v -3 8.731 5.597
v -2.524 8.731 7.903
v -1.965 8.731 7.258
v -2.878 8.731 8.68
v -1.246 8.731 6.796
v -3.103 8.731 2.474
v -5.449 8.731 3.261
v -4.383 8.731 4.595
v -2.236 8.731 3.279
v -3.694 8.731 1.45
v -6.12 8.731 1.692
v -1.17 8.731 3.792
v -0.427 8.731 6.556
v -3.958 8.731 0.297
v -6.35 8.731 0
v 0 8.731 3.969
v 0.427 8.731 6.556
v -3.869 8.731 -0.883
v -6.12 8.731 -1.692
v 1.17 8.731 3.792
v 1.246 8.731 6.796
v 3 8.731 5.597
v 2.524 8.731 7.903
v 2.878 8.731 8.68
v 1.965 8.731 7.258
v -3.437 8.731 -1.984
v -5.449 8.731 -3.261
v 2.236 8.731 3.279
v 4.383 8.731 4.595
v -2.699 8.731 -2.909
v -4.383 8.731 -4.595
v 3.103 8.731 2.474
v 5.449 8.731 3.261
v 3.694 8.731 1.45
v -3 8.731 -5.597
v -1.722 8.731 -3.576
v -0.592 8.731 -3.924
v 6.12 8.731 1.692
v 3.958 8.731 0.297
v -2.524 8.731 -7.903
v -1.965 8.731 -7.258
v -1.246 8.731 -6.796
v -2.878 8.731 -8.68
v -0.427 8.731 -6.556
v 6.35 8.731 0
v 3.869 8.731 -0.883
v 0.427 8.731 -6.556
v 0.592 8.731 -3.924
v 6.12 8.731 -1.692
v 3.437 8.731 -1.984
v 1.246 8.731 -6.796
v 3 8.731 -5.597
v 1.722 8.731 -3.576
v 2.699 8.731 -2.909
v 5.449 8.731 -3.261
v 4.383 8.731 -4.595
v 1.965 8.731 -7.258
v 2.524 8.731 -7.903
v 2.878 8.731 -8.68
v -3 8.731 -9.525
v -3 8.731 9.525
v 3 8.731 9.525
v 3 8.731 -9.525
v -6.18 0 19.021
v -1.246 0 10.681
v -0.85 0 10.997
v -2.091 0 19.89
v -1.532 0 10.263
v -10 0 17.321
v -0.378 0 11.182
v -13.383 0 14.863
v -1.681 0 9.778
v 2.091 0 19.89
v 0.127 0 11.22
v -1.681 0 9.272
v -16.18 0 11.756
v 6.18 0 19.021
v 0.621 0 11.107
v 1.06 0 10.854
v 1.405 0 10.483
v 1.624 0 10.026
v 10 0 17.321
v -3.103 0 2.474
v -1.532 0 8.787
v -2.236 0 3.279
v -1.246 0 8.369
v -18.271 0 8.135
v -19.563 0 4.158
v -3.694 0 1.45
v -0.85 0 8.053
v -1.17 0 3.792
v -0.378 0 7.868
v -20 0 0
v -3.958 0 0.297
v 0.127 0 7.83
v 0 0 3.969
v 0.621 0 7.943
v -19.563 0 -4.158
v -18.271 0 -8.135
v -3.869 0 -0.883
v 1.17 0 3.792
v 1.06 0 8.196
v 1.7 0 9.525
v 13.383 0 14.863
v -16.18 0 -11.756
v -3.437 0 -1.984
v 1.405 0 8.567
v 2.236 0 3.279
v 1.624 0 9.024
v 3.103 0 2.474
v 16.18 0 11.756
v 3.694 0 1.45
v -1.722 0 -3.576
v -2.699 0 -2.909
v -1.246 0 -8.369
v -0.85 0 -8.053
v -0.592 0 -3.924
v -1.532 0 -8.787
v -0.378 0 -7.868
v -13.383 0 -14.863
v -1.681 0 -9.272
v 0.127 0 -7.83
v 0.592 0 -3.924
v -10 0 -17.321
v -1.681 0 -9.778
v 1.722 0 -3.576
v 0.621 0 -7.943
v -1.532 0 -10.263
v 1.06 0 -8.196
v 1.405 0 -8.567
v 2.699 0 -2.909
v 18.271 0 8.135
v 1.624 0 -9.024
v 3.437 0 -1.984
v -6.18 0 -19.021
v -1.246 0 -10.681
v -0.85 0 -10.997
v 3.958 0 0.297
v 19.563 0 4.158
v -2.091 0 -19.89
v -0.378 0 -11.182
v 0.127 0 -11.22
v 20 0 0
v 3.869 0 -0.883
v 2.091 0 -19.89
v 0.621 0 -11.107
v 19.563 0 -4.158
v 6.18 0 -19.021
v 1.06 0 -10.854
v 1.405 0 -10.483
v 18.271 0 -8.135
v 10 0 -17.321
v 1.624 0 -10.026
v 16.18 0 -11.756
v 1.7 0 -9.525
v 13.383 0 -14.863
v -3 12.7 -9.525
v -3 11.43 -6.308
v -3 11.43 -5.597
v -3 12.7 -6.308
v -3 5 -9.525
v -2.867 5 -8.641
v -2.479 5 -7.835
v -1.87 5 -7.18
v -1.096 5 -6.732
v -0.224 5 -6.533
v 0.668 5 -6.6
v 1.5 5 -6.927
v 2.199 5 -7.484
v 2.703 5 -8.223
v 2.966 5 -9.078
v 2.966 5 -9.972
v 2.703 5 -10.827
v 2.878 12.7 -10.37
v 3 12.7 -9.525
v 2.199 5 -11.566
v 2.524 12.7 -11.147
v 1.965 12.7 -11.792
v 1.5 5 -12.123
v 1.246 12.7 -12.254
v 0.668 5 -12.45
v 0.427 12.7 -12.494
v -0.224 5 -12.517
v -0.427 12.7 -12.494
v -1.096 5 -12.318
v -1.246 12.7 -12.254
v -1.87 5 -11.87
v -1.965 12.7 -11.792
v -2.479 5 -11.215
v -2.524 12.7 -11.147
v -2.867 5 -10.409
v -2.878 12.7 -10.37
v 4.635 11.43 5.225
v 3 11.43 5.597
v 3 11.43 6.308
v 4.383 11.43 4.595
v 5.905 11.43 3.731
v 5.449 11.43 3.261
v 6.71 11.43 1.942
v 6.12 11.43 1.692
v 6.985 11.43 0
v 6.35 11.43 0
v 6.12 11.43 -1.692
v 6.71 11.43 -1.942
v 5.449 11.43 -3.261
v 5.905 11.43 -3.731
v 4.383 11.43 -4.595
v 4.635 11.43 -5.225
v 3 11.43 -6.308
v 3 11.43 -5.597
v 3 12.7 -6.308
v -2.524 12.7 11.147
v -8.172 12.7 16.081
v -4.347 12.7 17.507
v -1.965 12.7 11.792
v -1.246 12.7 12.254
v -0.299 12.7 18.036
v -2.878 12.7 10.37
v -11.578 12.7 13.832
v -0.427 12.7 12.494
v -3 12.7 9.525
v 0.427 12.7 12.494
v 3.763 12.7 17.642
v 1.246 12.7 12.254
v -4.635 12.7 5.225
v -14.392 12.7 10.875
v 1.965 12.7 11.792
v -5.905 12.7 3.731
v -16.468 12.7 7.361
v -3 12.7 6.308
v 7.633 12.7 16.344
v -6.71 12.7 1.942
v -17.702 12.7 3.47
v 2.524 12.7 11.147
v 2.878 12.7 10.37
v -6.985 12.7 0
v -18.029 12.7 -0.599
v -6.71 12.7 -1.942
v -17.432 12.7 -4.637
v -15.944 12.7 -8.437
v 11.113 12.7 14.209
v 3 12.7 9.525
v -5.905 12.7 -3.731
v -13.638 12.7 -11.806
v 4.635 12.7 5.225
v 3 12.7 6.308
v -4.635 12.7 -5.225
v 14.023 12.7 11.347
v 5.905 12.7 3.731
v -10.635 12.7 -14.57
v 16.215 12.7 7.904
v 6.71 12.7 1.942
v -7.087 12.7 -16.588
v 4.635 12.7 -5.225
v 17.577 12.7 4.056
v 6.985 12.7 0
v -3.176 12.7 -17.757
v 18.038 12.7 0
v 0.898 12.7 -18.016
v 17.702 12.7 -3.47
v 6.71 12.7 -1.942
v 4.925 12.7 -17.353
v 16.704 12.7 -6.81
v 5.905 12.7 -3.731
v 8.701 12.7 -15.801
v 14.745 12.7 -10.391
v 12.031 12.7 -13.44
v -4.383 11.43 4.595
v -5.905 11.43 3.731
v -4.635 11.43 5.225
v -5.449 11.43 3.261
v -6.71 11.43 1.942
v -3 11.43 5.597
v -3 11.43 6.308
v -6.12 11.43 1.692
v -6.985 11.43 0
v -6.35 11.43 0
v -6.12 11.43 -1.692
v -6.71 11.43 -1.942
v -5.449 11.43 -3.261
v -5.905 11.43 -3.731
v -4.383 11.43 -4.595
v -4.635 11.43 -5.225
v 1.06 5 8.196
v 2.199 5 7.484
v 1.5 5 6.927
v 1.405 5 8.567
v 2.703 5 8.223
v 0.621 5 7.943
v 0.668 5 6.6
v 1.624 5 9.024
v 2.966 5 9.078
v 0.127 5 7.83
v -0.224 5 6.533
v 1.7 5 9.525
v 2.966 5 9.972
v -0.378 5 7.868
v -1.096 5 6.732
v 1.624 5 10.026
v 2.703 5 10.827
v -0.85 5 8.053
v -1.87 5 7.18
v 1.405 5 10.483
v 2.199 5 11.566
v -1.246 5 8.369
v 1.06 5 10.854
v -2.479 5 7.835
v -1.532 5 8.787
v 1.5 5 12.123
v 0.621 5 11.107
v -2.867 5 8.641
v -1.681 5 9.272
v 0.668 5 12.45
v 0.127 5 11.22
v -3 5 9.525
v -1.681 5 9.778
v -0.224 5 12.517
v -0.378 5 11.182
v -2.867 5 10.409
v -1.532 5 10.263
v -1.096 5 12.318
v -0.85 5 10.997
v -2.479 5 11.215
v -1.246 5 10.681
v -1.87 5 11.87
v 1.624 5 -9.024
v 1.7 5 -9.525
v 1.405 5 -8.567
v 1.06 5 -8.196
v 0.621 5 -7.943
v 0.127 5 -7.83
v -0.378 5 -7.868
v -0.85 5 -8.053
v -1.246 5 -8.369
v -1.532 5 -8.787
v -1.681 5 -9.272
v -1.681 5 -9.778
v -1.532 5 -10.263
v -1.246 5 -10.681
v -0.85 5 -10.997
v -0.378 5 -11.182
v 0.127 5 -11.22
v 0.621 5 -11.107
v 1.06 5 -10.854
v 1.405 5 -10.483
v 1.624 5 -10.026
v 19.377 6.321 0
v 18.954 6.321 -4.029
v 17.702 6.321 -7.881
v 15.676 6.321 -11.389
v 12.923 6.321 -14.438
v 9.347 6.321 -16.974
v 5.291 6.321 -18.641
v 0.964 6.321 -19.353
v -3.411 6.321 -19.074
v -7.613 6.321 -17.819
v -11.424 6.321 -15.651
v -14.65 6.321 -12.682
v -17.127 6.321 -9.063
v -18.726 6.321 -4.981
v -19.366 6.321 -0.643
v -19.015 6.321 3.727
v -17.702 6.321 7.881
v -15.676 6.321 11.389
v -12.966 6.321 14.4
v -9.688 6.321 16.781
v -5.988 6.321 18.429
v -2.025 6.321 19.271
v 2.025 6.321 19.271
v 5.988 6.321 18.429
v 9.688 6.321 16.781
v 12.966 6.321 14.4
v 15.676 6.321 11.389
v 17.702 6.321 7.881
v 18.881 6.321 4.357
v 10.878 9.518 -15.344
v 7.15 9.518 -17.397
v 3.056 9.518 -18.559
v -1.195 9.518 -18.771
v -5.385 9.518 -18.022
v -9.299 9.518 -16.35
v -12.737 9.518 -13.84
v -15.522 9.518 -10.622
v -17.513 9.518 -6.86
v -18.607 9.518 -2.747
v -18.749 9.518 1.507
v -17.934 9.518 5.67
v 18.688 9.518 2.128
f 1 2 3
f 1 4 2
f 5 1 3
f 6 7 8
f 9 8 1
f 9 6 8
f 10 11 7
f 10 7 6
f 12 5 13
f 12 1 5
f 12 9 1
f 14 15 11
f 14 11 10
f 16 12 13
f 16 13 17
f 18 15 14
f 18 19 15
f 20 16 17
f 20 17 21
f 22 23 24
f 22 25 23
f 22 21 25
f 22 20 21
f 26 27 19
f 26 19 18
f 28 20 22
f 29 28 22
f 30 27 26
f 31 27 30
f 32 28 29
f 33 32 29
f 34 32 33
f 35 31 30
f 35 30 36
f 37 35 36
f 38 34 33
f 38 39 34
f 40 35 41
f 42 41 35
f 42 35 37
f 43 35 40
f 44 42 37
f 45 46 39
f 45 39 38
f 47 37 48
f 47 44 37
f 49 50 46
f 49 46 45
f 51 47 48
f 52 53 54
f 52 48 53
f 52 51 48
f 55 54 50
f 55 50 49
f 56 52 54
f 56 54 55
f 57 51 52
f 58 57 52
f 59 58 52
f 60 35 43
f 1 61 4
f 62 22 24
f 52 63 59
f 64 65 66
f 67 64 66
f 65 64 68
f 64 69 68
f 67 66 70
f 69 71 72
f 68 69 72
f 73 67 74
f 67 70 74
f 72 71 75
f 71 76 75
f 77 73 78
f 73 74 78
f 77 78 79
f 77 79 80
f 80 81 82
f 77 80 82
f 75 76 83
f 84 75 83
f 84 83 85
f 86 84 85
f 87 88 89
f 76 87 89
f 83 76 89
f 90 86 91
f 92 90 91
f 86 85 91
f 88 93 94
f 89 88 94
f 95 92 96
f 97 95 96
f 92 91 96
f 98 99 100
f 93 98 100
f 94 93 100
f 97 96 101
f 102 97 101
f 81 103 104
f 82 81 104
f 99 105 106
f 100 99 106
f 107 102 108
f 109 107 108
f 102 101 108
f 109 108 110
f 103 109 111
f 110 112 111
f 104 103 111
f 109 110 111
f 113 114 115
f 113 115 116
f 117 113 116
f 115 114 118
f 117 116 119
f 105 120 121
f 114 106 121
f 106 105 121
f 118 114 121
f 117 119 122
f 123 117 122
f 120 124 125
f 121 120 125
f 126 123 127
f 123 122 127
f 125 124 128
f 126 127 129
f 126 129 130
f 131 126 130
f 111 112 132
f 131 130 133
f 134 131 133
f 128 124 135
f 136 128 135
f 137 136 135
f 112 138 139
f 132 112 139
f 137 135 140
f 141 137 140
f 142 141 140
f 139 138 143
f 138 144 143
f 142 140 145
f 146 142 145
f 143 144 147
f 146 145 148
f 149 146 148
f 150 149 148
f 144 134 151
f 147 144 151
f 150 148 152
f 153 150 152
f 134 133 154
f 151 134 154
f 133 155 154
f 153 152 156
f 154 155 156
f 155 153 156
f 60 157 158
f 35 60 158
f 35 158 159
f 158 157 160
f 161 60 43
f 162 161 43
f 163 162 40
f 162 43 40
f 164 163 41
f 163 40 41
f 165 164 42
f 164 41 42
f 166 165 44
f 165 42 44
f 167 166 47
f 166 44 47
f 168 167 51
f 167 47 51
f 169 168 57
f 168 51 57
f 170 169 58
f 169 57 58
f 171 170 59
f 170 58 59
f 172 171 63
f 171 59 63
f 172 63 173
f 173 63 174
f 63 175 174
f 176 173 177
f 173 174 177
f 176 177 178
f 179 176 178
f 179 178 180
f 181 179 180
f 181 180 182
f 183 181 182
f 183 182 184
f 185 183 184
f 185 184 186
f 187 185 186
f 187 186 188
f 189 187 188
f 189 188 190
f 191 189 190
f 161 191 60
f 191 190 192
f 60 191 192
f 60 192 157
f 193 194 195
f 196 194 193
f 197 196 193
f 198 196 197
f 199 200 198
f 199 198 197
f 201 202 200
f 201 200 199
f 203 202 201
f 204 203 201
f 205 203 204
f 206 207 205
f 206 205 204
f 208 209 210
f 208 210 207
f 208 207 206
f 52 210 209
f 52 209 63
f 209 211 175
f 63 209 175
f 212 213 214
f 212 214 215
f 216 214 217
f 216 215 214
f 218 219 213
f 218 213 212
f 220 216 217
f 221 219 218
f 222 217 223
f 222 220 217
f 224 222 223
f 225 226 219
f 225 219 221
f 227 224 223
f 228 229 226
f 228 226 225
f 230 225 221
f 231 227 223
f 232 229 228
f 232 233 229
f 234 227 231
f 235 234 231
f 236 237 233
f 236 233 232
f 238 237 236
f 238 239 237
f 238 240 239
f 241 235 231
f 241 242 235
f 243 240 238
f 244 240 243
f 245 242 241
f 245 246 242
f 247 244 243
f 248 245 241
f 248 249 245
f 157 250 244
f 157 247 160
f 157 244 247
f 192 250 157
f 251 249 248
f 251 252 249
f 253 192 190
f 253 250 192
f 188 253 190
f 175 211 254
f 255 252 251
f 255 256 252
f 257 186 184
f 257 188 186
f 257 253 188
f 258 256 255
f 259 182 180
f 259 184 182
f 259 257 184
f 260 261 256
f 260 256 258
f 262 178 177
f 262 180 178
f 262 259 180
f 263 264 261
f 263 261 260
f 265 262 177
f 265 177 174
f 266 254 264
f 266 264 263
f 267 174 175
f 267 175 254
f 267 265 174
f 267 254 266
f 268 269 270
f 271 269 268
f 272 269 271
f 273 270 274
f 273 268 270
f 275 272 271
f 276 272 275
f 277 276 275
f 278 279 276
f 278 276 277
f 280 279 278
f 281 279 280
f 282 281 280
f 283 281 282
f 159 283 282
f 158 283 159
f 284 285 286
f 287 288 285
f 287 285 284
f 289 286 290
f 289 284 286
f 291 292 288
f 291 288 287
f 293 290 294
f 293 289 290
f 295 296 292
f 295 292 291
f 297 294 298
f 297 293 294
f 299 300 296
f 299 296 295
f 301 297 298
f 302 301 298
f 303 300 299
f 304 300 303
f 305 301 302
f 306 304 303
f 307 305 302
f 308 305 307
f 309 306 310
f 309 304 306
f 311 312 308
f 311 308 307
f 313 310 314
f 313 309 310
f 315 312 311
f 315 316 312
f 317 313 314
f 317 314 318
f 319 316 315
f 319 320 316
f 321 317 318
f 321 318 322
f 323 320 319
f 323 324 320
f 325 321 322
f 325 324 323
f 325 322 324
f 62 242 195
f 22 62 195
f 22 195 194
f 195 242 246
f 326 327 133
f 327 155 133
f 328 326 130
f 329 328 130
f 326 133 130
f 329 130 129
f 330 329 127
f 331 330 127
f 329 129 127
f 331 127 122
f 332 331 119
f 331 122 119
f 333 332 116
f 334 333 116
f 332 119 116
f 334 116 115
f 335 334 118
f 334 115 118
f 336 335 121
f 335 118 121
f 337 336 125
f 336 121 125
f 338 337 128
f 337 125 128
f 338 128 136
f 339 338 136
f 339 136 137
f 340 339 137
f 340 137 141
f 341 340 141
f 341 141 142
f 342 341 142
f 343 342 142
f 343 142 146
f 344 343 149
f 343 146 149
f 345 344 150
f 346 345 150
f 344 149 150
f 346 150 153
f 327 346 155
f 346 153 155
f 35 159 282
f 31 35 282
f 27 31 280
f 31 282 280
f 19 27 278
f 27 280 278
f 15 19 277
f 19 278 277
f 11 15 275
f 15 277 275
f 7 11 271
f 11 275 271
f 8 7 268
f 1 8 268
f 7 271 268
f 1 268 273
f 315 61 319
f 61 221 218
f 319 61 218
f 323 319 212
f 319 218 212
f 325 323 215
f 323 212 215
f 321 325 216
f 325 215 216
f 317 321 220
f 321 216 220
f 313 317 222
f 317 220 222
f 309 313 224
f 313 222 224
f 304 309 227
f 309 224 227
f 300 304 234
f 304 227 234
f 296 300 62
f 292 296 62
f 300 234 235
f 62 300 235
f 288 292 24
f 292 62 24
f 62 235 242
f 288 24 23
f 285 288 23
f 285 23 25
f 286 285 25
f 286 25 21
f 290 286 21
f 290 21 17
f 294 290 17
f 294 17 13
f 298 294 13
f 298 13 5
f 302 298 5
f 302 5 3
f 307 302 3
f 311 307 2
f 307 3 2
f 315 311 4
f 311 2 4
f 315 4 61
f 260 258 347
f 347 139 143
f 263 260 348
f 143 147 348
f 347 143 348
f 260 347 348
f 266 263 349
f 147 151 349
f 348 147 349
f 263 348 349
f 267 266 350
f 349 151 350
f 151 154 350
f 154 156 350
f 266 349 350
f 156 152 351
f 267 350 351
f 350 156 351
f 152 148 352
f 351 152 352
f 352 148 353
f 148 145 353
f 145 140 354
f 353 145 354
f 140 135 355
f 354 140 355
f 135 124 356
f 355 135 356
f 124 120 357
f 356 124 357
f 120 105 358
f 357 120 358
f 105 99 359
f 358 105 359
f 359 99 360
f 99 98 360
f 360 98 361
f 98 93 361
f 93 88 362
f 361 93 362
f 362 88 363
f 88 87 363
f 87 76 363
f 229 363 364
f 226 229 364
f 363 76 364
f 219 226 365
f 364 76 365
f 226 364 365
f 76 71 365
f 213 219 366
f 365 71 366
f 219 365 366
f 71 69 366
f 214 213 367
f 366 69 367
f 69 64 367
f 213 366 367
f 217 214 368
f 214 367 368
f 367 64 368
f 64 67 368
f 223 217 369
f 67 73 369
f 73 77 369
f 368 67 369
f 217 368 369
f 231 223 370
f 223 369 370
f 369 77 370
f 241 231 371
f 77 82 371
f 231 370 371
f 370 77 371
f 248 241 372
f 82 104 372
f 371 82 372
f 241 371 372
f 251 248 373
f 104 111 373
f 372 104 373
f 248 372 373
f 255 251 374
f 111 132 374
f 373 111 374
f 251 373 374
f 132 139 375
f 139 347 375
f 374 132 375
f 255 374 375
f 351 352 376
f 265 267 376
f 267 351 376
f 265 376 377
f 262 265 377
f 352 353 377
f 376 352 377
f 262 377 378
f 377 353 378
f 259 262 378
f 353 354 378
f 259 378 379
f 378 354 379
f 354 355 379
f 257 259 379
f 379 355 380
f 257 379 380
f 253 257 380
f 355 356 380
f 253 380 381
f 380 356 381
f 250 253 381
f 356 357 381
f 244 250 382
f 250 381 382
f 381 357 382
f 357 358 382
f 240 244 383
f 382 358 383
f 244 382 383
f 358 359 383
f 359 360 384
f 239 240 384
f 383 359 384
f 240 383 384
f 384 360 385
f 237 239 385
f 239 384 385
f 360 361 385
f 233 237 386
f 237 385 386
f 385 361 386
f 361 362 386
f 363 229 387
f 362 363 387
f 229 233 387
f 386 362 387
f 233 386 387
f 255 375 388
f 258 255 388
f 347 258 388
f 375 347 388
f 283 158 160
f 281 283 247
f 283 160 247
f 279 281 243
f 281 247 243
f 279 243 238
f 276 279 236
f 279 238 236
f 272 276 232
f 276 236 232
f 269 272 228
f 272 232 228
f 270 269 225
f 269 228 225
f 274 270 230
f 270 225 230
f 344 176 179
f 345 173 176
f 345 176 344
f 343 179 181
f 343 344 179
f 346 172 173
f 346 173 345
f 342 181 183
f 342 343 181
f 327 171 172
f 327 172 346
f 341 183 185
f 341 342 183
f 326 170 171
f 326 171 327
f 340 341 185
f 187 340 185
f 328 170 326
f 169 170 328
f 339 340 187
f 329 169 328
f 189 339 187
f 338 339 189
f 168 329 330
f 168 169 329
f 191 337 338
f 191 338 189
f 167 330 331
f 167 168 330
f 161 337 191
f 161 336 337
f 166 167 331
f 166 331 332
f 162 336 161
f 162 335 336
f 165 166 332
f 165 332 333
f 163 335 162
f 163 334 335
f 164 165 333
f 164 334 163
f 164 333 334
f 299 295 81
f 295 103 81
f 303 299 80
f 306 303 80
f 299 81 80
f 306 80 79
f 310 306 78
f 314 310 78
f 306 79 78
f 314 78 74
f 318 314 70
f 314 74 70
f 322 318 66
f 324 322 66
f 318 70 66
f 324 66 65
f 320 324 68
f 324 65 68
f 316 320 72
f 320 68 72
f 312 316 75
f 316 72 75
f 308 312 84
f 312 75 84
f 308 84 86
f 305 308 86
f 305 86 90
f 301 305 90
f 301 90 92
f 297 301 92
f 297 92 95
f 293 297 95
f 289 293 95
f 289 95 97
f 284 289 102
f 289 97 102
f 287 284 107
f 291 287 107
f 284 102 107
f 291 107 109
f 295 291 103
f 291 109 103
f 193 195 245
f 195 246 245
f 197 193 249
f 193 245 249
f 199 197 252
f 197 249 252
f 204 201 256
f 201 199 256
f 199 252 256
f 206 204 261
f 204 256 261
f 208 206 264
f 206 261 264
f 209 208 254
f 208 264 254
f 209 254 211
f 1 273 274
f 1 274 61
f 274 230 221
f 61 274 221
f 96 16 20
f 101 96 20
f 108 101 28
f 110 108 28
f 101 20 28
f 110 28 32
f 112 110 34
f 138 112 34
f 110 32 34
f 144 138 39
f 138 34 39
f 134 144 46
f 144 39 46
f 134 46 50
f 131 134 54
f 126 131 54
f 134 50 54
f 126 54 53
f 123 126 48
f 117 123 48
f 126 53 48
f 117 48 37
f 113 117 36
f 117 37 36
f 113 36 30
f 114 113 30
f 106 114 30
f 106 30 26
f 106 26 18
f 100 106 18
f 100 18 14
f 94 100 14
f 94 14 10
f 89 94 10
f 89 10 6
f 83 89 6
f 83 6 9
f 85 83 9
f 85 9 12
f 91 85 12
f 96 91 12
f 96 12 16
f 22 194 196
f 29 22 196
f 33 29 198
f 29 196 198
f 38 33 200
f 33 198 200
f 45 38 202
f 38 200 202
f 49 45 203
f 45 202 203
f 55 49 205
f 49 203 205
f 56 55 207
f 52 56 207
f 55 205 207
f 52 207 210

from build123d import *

# Parameters (mm, degrees)
CBORE_FOR_M3_HEX_HEAD_BOLT1_D           = 3.4
CBORE_FOR_M3_HEX_HEAD_BOLT1_CBORE_D     = 6
CBORE_FOR_M3_HEX_HEAD_BOLT1_CBORE_DEPTH = 35
CUT_EXTRUDE1_DEPTH                      = 43.521318352
CUT_EXTRUDE1_DEPTH_BACK                 = 43.521318352
SKETCH1_W                               = 45.460757026
SKETCH1_H                               = 38.1
CUT_EXTRUDE2_DEPTH                      = 3.96875
SKETCH3_R                               = 6.985
CUT_EXTRUDE3_DEPTH                      = 1.27
SKETCH4_R                               = 3.96875
CUT_EXTRUDE4_DEPTH                      = 30.601262411


with BuildPart() as part:
    # 草图1 → 旋转1 (revolve)
    with BuildSketch(Plane.XY):
        with BuildLine():
            Line((0, 0), (0, 31.75))
            Line((0, 31.75), (5.477501396, 31.75))
            add(Edge.make_bspline(
                [(5.477501396, 31.75), (16.24161295, 23.874290145), (19.406701728, 11.219456234), (20, 0)],
                knots=[0.132414506, 0.132414506, 0.132414506, 0.132414506, 1, 1, 1, 1], degree=3))
            Line((20, 0), (0, 0))
        make_face()
    revolve(axis=Axis((0, 0, 0), (0, 1, 0)))

    # CBORE for M3 Hex Head Bolt1 (through all)
    with Locations(Plane(origin=(0, 40, 0), x_dir=(-1, 0, 0), z_dir=(0, 1, 0))):
        with Locations((0, -9.525), (0, 9.525)):
            CounterBoreHole(CBORE_FOR_M3_HEX_HEAD_BOLT1_D / 2, CBORE_FOR_M3_HEX_HEAD_BOLT1_CBORE_D / 2, CBORE_FOR_M3_HEX_HEAD_BOLT1_CBORE_DEPTH)

    # Sketch1 → Cut-Extrude1 (cut, two sides: drawn at the far end of the back side and taken through both)
    with BuildSketch(Plane.XY.offset(-CUT_EXTRUDE1_DEPTH_BACK)):
        with Locations((0, 31.75)):
            Rectangle(SKETCH1_W, SKETCH1_H)
    extrude(amount=CUT_EXTRUDE1_DEPTH + CUT_EXTRUDE1_DEPTH_BACK, mode=Mode.SUBTRACT)

    # Sketch2 → Cut-Extrude2 (cut)
    with BuildSketch(Plane(origin=(0, 12.7, 0), x_dir=(1, 0, 0), z_dir=(0, 1, 0))):
        with BuildLine():
            Line((-3, 9.525), (-3, 5.596650784))
            ThreePointArc((-3, 5.596650784), (-6.35, 0), (-3, -5.596650784))
            Line((-3, -5.596650784), (-3, -9.525))
            ThreePointArc((-3, -9.525), (0, -12.525), (3, -9.525))
            Line((3, -9.525), (3, -5.596650784))
            ThreePointArc((3, -5.596650784), (6.35, 0), (3, 5.596650784))
            Line((3, 5.596650784), (3, 9.525))
            ThreePointArc((3, 9.525), (0, 12.525), (-3, 9.525))
        make_face()
    extrude(amount=-CUT_EXTRUDE2_DEPTH, mode=Mode.SUBTRACT)

    # Sketch3 → Cut-Extrude3 (cut)
    with BuildSketch(Plane(origin=(0, 12.7, 0), x_dir=(1, 0, 0), z_dir=(0, 1, 0))):
        Circle(SKETCH3_R)
    extrude(amount=-CUT_EXTRUDE3_DEPTH, mode=Mode.SUBTRACT)

    # Sketch4 → Cut-Extrude4 (cut, through all)
    with BuildSketch(Plane(origin=(0, 8.73125, 0), x_dir=(1, 0, 0), z_dir=(0, 1, 0))):
        with Locations(Location((0, 0, 0), (0, 0, 270))):
            Circle(SKETCH4_R)
    extrude(amount=-CUT_EXTRUDE4_DEPTH, mode=Mode.SUBTRACT)


solid = part.part
